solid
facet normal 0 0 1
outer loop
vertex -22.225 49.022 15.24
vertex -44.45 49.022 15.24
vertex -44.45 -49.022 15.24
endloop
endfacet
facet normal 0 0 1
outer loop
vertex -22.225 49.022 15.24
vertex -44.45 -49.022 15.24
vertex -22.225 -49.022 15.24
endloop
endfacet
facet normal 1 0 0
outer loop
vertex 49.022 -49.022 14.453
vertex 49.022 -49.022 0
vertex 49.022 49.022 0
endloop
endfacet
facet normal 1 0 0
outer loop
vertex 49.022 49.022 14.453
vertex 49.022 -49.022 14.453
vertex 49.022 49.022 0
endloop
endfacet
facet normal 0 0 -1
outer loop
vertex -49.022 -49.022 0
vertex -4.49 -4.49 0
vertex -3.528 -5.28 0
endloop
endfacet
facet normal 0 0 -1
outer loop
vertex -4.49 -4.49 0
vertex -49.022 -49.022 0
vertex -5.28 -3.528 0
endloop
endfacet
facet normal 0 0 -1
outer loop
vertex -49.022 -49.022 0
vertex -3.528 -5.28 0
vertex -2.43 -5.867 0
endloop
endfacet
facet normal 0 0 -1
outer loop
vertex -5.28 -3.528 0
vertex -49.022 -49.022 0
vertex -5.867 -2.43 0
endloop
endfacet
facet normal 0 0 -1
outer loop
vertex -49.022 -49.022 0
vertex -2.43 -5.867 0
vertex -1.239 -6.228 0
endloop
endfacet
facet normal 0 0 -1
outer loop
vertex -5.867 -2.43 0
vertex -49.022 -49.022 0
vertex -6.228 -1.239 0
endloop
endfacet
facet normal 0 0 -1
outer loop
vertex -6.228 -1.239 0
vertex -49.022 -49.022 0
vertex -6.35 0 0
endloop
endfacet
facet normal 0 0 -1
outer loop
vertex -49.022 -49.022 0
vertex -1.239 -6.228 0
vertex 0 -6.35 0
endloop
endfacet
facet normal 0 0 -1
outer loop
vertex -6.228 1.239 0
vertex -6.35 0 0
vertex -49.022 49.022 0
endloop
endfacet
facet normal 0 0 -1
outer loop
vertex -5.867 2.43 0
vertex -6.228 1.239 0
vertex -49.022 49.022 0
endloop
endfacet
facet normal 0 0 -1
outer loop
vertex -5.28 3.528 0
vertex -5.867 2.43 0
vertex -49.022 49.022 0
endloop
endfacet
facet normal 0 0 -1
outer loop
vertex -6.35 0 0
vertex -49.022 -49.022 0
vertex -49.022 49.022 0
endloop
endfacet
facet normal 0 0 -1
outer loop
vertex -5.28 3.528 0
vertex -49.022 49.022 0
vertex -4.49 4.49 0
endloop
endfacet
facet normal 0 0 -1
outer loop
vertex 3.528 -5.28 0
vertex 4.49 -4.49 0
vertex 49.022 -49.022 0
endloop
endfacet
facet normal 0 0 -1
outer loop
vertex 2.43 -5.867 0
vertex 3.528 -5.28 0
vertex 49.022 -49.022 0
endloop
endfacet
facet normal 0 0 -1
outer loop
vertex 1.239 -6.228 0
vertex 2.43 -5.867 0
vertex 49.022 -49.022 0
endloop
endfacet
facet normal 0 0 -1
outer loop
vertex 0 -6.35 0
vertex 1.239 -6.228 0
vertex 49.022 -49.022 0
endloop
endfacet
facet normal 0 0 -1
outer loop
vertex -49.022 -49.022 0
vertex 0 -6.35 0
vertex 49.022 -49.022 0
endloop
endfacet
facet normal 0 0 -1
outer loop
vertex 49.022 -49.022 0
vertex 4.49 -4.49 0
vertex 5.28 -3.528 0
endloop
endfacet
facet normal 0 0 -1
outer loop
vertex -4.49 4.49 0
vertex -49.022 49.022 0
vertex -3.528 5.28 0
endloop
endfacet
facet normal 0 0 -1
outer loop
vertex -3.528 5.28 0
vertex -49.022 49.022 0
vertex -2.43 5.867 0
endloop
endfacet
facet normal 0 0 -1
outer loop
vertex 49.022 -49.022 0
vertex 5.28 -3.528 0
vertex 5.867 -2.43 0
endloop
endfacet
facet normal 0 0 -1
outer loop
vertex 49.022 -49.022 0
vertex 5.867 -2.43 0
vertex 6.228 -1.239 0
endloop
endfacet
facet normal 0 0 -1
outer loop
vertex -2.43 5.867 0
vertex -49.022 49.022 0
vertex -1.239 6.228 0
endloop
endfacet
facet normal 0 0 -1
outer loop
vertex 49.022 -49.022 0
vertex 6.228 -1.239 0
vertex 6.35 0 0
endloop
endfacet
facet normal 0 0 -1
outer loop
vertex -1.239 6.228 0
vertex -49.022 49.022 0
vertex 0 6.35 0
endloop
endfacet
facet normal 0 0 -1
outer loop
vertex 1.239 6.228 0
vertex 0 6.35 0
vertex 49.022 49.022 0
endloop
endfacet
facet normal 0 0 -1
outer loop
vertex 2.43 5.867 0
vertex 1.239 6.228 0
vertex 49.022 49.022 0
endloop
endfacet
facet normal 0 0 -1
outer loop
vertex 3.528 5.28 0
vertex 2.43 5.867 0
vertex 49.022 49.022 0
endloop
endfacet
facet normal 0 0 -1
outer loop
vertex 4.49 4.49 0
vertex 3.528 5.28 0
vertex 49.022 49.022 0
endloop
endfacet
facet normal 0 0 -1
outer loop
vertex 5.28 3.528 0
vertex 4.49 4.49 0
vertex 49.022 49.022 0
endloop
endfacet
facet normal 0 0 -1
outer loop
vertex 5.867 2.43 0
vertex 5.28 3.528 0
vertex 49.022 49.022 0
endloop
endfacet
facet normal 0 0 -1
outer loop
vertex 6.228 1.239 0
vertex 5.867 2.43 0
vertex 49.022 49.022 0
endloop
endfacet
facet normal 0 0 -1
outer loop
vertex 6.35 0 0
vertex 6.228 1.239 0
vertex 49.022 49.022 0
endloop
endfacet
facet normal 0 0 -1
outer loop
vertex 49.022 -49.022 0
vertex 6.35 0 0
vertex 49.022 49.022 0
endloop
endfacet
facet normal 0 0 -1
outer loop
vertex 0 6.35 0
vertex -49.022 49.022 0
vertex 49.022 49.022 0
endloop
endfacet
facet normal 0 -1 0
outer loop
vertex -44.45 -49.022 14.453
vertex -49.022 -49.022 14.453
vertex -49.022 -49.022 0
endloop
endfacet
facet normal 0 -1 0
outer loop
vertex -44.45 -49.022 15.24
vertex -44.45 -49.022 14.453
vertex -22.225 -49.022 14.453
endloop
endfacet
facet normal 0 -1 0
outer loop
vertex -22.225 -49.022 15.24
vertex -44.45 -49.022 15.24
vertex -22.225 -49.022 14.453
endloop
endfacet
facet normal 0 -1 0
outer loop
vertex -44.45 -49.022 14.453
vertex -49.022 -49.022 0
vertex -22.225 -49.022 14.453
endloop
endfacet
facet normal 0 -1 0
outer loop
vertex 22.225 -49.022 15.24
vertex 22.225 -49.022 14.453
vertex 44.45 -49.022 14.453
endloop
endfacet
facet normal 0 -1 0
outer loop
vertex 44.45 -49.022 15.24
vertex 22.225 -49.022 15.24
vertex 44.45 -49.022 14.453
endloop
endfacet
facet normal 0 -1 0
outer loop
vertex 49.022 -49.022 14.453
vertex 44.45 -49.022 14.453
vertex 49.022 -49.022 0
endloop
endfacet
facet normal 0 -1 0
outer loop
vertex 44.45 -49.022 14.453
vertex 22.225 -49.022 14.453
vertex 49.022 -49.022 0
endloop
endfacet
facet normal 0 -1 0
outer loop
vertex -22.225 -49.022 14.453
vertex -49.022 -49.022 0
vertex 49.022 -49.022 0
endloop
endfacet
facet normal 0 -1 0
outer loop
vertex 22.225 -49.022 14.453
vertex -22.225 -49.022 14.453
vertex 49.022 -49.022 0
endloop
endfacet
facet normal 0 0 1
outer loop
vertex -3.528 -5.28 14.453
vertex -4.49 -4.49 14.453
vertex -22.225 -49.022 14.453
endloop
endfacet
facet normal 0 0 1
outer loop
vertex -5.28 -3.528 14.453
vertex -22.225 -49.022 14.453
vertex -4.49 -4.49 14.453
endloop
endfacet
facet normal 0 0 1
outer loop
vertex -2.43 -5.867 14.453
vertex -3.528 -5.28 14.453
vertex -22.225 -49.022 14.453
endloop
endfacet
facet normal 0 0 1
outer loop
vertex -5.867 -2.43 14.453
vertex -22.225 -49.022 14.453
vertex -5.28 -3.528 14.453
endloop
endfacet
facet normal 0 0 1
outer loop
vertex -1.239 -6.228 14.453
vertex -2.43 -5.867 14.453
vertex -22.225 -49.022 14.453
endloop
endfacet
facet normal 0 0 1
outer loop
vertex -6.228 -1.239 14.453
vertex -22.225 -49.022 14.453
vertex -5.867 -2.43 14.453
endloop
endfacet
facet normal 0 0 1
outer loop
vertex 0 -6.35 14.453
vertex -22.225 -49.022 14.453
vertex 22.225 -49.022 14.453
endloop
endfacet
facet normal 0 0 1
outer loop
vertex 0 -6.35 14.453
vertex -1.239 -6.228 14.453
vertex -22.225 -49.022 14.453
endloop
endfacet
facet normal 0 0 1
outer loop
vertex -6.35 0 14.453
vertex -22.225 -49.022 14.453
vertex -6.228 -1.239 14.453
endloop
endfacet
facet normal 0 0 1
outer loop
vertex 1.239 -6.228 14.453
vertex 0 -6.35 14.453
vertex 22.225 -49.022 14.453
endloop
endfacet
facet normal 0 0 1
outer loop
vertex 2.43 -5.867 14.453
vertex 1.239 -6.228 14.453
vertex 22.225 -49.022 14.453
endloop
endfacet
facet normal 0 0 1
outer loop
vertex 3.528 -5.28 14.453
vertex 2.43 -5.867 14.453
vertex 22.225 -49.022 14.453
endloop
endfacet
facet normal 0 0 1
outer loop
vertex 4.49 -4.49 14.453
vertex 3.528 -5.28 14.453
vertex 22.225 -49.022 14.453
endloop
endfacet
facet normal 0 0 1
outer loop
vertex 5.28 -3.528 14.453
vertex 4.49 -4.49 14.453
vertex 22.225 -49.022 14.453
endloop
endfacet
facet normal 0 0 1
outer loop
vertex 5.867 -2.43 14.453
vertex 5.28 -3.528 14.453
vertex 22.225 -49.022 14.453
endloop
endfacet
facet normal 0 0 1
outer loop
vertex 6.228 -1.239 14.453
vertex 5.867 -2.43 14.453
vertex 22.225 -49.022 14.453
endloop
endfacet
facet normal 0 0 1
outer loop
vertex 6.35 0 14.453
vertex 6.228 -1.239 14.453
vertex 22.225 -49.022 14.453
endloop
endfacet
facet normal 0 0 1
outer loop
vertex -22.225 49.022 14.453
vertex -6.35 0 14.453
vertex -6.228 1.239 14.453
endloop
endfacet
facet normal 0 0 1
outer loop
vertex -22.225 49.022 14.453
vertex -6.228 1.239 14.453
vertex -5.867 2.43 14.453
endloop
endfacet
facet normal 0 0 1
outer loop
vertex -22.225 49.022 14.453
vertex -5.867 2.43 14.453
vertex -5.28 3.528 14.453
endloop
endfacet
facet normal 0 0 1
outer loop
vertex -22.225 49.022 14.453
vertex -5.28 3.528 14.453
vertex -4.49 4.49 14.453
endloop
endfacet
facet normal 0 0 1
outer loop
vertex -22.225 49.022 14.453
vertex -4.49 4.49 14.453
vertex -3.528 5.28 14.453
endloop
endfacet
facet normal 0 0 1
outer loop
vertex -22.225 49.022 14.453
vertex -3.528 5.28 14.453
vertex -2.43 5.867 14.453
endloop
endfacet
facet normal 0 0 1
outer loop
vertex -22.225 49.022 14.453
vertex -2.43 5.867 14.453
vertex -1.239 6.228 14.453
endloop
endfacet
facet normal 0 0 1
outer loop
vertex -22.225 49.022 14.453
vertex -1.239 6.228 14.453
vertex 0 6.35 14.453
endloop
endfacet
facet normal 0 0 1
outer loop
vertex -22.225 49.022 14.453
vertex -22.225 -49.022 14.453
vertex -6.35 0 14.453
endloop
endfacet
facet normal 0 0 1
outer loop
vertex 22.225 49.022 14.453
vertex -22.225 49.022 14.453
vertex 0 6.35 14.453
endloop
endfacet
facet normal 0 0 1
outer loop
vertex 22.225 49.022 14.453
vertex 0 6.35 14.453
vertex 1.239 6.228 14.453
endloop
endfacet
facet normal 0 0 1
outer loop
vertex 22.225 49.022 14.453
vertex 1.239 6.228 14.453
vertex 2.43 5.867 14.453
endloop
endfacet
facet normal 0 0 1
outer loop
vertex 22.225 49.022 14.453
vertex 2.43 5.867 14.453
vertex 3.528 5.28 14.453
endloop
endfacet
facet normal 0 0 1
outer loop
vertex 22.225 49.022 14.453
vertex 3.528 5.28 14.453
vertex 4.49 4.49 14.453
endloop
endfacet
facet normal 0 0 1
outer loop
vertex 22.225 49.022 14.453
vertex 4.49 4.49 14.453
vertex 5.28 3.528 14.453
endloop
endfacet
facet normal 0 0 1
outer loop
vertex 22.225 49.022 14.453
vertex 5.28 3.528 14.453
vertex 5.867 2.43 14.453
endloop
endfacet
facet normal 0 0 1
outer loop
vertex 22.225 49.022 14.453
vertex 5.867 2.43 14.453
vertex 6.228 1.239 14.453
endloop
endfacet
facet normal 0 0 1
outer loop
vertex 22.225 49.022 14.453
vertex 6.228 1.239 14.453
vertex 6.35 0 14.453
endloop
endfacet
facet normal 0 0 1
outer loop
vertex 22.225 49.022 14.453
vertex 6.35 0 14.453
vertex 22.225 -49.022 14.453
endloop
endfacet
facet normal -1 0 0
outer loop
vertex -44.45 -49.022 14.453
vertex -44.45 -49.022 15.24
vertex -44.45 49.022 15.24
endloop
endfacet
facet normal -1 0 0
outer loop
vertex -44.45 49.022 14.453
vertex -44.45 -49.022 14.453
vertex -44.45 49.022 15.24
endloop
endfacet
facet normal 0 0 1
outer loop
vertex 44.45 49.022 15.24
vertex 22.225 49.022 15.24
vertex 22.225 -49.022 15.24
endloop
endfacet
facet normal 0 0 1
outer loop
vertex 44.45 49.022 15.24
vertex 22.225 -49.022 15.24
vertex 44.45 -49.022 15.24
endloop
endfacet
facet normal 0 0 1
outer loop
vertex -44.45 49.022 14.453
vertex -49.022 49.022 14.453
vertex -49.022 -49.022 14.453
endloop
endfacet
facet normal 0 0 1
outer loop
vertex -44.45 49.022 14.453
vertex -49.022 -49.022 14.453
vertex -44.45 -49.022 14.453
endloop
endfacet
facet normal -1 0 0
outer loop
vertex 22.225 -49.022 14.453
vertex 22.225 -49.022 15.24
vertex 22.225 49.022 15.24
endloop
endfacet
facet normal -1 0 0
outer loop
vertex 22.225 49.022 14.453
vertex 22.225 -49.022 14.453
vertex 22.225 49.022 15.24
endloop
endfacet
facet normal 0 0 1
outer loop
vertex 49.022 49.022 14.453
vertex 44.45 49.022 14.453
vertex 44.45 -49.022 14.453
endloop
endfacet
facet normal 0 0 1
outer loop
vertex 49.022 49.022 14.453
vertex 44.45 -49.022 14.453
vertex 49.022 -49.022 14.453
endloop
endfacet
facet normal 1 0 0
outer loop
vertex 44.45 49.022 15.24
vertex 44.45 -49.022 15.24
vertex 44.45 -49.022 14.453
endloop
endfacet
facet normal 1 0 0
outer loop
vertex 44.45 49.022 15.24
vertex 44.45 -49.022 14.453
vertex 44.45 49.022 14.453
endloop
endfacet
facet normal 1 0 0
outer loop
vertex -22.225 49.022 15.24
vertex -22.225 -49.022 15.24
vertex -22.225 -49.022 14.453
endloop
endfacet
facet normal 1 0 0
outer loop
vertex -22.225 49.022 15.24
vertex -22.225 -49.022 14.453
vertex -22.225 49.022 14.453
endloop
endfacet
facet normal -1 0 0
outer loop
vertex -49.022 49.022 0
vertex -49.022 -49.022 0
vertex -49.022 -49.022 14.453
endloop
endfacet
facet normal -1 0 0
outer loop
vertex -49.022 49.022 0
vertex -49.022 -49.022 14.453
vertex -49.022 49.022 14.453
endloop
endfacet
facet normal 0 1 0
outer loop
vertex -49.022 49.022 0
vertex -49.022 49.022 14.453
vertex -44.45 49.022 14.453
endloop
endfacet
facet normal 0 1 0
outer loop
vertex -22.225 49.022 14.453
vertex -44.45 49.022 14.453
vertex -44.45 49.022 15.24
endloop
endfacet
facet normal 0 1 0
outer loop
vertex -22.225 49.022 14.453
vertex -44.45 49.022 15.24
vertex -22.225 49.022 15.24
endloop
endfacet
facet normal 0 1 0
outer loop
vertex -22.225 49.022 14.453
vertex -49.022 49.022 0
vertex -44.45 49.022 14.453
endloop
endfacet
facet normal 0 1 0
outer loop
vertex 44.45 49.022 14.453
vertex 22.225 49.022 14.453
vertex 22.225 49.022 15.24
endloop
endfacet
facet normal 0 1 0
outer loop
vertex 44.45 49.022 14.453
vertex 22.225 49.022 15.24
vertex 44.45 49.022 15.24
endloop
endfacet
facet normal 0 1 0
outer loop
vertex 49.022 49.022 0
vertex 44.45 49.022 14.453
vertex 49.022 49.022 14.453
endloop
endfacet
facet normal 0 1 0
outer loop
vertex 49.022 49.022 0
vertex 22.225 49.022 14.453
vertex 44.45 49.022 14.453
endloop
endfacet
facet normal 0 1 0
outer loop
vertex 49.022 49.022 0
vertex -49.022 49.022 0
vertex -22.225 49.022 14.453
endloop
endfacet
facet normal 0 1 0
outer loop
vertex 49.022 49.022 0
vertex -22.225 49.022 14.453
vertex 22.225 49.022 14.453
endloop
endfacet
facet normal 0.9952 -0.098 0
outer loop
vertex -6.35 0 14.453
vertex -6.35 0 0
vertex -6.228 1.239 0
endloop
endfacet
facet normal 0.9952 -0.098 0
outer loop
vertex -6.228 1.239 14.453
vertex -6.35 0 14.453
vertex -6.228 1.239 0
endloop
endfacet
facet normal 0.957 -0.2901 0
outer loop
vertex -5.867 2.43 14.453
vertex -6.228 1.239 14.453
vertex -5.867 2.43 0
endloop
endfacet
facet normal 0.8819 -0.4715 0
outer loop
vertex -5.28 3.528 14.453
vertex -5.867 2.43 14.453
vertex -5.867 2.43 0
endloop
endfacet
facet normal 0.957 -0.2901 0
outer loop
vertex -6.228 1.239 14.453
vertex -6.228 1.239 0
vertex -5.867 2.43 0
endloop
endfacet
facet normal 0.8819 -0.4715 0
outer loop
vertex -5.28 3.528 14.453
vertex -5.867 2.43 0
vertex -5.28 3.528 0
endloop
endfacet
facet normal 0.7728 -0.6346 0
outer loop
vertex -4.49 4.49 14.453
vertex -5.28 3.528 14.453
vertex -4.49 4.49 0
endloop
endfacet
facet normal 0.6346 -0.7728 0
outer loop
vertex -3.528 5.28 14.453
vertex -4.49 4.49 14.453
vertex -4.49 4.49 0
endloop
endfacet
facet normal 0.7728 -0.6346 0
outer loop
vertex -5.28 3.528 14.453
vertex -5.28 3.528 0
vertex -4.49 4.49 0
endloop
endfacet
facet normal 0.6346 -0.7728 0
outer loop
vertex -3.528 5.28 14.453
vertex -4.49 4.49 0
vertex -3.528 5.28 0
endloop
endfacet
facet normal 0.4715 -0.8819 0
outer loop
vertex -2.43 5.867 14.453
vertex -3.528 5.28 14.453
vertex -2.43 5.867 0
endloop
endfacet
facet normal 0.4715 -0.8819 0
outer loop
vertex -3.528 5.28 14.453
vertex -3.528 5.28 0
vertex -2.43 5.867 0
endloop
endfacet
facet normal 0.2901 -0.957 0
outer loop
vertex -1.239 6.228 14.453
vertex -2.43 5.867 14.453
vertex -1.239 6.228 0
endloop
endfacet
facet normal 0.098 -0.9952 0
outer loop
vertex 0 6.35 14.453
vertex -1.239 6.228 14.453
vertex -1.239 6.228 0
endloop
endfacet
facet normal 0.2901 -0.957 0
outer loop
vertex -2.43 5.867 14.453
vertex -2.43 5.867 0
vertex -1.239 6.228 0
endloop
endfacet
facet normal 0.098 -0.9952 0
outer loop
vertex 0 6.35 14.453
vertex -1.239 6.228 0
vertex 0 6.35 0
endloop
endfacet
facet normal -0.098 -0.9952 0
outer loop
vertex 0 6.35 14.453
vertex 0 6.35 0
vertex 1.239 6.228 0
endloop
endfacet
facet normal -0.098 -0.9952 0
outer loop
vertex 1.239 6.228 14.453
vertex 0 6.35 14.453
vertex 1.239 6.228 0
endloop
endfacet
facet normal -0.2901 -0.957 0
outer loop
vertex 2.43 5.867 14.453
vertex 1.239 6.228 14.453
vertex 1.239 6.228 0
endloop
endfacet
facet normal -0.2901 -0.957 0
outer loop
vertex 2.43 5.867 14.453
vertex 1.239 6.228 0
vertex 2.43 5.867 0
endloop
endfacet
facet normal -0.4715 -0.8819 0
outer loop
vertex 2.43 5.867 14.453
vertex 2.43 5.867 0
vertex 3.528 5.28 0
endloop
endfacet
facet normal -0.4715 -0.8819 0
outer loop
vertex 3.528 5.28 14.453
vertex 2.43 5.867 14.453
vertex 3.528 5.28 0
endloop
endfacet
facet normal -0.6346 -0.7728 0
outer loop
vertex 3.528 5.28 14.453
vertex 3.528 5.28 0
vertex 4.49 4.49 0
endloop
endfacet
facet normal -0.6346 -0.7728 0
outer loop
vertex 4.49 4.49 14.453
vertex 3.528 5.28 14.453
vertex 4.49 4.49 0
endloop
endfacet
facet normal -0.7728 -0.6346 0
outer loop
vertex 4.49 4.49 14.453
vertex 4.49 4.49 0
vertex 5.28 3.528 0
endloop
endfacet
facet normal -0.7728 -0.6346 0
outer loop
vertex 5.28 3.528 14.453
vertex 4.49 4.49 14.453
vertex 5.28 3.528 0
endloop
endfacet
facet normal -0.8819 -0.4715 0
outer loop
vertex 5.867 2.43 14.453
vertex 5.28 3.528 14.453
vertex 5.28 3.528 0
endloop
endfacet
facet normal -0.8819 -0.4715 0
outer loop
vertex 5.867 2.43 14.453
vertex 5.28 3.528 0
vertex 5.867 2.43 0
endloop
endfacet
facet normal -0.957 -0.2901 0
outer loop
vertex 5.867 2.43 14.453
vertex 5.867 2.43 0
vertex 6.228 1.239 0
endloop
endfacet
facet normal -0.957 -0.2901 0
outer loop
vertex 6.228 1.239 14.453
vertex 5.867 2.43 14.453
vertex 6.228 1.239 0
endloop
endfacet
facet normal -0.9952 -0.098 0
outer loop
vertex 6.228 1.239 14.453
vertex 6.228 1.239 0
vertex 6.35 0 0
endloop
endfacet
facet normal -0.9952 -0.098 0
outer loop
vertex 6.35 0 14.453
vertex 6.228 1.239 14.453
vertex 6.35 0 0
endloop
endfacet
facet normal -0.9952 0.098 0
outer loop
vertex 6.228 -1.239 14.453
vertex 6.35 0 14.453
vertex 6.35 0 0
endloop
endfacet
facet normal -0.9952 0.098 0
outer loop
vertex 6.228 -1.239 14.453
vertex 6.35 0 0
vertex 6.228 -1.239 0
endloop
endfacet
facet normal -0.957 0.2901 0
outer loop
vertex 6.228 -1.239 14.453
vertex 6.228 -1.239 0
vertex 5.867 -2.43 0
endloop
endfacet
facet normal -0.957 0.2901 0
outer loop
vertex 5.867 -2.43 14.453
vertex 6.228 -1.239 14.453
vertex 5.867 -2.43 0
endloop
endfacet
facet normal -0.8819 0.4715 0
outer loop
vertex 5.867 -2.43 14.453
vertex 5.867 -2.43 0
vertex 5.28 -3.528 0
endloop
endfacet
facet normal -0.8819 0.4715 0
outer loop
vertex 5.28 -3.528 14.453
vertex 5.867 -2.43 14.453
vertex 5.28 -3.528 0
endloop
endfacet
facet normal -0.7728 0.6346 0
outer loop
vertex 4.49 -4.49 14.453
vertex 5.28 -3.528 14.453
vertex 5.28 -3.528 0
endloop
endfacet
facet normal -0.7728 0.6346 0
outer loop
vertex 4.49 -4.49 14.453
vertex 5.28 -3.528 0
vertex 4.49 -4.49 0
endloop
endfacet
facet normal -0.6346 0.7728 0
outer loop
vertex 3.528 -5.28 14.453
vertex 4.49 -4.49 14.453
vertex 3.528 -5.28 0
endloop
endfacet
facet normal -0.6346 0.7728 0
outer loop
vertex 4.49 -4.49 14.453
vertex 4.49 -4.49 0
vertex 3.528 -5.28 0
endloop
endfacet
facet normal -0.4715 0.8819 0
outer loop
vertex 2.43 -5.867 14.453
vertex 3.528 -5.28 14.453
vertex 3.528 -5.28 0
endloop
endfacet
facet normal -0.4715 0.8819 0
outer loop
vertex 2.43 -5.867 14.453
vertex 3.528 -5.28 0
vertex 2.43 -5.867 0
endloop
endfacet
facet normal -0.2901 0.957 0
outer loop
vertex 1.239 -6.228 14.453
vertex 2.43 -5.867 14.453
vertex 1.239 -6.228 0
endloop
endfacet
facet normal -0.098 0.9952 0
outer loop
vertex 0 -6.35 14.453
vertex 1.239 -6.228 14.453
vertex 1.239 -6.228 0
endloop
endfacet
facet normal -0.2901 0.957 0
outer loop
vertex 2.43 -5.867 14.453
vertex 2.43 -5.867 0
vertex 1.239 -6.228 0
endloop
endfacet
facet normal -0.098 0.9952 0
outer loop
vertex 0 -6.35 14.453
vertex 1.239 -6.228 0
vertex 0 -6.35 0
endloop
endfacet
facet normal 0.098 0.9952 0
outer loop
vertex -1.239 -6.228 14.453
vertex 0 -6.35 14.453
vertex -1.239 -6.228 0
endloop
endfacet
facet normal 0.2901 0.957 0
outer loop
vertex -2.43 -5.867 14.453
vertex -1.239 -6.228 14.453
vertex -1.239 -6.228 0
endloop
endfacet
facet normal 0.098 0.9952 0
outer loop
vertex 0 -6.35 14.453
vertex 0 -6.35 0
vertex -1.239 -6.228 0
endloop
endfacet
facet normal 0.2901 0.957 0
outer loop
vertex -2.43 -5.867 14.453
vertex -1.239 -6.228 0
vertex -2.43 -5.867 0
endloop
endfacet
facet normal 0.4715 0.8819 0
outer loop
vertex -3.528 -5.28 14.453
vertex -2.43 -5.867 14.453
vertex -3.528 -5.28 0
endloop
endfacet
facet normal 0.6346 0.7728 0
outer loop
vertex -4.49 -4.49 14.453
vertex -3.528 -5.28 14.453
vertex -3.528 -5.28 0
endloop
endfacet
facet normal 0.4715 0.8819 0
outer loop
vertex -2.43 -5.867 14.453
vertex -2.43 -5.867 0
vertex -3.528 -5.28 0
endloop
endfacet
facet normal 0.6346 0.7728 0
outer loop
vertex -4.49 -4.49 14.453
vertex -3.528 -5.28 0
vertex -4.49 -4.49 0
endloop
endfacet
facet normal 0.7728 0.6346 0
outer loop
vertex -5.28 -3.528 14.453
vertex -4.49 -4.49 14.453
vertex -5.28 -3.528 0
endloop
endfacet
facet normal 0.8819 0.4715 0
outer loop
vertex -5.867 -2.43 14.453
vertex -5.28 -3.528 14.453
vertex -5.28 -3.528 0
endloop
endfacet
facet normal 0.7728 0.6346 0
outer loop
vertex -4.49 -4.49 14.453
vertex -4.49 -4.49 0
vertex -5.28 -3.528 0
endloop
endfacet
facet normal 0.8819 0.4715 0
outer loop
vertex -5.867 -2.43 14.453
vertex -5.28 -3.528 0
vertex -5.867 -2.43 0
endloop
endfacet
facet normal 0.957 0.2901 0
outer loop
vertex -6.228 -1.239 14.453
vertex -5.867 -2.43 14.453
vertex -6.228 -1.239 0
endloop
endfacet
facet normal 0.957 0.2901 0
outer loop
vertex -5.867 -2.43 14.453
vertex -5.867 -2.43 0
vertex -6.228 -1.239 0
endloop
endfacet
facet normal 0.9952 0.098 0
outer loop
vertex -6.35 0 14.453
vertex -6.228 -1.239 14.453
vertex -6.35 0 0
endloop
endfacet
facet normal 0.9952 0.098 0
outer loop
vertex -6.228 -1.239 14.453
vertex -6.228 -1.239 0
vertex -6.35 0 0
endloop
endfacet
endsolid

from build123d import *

# Parameters (mm, degrees)
F0_W     = 98.044
F0_H     = 98.044
F1_DEPTH = 15.24
F3_D     = 12.7
F2_W     = 4.572
F2_H     = 98.044
F2_W_2   = 44.45
F4_DEPTH = 0.7874


with BuildPart() as f1:
    # F0 (on Top) → F1 (new body)
    with BuildSketch(Plane.XY):
        Rectangle(F0_W, F0_H)
    extrude(amount=F1_DEPTH)

    # F3 (through all)
    with Locations(Plane.XY.offset(15.24)):
        with Locations((0, 0)):
            Hole(F3_D / 2)

    # F2 (on face) → F4 (cut)
    with BuildSketch(Plane.XY.offset(15.24)):
        with Locations((-46.736, 0)):
            Rectangle(F2_W, F2_H)
        with Locations((46.736, 0)):
            Rectangle(F2_W, F2_H)
        Rectangle(F2_W_2, F2_H)
    extrude(amount=-F4_DEPTH, mode=Mode.SUBTRACT)


solid = f1.part
